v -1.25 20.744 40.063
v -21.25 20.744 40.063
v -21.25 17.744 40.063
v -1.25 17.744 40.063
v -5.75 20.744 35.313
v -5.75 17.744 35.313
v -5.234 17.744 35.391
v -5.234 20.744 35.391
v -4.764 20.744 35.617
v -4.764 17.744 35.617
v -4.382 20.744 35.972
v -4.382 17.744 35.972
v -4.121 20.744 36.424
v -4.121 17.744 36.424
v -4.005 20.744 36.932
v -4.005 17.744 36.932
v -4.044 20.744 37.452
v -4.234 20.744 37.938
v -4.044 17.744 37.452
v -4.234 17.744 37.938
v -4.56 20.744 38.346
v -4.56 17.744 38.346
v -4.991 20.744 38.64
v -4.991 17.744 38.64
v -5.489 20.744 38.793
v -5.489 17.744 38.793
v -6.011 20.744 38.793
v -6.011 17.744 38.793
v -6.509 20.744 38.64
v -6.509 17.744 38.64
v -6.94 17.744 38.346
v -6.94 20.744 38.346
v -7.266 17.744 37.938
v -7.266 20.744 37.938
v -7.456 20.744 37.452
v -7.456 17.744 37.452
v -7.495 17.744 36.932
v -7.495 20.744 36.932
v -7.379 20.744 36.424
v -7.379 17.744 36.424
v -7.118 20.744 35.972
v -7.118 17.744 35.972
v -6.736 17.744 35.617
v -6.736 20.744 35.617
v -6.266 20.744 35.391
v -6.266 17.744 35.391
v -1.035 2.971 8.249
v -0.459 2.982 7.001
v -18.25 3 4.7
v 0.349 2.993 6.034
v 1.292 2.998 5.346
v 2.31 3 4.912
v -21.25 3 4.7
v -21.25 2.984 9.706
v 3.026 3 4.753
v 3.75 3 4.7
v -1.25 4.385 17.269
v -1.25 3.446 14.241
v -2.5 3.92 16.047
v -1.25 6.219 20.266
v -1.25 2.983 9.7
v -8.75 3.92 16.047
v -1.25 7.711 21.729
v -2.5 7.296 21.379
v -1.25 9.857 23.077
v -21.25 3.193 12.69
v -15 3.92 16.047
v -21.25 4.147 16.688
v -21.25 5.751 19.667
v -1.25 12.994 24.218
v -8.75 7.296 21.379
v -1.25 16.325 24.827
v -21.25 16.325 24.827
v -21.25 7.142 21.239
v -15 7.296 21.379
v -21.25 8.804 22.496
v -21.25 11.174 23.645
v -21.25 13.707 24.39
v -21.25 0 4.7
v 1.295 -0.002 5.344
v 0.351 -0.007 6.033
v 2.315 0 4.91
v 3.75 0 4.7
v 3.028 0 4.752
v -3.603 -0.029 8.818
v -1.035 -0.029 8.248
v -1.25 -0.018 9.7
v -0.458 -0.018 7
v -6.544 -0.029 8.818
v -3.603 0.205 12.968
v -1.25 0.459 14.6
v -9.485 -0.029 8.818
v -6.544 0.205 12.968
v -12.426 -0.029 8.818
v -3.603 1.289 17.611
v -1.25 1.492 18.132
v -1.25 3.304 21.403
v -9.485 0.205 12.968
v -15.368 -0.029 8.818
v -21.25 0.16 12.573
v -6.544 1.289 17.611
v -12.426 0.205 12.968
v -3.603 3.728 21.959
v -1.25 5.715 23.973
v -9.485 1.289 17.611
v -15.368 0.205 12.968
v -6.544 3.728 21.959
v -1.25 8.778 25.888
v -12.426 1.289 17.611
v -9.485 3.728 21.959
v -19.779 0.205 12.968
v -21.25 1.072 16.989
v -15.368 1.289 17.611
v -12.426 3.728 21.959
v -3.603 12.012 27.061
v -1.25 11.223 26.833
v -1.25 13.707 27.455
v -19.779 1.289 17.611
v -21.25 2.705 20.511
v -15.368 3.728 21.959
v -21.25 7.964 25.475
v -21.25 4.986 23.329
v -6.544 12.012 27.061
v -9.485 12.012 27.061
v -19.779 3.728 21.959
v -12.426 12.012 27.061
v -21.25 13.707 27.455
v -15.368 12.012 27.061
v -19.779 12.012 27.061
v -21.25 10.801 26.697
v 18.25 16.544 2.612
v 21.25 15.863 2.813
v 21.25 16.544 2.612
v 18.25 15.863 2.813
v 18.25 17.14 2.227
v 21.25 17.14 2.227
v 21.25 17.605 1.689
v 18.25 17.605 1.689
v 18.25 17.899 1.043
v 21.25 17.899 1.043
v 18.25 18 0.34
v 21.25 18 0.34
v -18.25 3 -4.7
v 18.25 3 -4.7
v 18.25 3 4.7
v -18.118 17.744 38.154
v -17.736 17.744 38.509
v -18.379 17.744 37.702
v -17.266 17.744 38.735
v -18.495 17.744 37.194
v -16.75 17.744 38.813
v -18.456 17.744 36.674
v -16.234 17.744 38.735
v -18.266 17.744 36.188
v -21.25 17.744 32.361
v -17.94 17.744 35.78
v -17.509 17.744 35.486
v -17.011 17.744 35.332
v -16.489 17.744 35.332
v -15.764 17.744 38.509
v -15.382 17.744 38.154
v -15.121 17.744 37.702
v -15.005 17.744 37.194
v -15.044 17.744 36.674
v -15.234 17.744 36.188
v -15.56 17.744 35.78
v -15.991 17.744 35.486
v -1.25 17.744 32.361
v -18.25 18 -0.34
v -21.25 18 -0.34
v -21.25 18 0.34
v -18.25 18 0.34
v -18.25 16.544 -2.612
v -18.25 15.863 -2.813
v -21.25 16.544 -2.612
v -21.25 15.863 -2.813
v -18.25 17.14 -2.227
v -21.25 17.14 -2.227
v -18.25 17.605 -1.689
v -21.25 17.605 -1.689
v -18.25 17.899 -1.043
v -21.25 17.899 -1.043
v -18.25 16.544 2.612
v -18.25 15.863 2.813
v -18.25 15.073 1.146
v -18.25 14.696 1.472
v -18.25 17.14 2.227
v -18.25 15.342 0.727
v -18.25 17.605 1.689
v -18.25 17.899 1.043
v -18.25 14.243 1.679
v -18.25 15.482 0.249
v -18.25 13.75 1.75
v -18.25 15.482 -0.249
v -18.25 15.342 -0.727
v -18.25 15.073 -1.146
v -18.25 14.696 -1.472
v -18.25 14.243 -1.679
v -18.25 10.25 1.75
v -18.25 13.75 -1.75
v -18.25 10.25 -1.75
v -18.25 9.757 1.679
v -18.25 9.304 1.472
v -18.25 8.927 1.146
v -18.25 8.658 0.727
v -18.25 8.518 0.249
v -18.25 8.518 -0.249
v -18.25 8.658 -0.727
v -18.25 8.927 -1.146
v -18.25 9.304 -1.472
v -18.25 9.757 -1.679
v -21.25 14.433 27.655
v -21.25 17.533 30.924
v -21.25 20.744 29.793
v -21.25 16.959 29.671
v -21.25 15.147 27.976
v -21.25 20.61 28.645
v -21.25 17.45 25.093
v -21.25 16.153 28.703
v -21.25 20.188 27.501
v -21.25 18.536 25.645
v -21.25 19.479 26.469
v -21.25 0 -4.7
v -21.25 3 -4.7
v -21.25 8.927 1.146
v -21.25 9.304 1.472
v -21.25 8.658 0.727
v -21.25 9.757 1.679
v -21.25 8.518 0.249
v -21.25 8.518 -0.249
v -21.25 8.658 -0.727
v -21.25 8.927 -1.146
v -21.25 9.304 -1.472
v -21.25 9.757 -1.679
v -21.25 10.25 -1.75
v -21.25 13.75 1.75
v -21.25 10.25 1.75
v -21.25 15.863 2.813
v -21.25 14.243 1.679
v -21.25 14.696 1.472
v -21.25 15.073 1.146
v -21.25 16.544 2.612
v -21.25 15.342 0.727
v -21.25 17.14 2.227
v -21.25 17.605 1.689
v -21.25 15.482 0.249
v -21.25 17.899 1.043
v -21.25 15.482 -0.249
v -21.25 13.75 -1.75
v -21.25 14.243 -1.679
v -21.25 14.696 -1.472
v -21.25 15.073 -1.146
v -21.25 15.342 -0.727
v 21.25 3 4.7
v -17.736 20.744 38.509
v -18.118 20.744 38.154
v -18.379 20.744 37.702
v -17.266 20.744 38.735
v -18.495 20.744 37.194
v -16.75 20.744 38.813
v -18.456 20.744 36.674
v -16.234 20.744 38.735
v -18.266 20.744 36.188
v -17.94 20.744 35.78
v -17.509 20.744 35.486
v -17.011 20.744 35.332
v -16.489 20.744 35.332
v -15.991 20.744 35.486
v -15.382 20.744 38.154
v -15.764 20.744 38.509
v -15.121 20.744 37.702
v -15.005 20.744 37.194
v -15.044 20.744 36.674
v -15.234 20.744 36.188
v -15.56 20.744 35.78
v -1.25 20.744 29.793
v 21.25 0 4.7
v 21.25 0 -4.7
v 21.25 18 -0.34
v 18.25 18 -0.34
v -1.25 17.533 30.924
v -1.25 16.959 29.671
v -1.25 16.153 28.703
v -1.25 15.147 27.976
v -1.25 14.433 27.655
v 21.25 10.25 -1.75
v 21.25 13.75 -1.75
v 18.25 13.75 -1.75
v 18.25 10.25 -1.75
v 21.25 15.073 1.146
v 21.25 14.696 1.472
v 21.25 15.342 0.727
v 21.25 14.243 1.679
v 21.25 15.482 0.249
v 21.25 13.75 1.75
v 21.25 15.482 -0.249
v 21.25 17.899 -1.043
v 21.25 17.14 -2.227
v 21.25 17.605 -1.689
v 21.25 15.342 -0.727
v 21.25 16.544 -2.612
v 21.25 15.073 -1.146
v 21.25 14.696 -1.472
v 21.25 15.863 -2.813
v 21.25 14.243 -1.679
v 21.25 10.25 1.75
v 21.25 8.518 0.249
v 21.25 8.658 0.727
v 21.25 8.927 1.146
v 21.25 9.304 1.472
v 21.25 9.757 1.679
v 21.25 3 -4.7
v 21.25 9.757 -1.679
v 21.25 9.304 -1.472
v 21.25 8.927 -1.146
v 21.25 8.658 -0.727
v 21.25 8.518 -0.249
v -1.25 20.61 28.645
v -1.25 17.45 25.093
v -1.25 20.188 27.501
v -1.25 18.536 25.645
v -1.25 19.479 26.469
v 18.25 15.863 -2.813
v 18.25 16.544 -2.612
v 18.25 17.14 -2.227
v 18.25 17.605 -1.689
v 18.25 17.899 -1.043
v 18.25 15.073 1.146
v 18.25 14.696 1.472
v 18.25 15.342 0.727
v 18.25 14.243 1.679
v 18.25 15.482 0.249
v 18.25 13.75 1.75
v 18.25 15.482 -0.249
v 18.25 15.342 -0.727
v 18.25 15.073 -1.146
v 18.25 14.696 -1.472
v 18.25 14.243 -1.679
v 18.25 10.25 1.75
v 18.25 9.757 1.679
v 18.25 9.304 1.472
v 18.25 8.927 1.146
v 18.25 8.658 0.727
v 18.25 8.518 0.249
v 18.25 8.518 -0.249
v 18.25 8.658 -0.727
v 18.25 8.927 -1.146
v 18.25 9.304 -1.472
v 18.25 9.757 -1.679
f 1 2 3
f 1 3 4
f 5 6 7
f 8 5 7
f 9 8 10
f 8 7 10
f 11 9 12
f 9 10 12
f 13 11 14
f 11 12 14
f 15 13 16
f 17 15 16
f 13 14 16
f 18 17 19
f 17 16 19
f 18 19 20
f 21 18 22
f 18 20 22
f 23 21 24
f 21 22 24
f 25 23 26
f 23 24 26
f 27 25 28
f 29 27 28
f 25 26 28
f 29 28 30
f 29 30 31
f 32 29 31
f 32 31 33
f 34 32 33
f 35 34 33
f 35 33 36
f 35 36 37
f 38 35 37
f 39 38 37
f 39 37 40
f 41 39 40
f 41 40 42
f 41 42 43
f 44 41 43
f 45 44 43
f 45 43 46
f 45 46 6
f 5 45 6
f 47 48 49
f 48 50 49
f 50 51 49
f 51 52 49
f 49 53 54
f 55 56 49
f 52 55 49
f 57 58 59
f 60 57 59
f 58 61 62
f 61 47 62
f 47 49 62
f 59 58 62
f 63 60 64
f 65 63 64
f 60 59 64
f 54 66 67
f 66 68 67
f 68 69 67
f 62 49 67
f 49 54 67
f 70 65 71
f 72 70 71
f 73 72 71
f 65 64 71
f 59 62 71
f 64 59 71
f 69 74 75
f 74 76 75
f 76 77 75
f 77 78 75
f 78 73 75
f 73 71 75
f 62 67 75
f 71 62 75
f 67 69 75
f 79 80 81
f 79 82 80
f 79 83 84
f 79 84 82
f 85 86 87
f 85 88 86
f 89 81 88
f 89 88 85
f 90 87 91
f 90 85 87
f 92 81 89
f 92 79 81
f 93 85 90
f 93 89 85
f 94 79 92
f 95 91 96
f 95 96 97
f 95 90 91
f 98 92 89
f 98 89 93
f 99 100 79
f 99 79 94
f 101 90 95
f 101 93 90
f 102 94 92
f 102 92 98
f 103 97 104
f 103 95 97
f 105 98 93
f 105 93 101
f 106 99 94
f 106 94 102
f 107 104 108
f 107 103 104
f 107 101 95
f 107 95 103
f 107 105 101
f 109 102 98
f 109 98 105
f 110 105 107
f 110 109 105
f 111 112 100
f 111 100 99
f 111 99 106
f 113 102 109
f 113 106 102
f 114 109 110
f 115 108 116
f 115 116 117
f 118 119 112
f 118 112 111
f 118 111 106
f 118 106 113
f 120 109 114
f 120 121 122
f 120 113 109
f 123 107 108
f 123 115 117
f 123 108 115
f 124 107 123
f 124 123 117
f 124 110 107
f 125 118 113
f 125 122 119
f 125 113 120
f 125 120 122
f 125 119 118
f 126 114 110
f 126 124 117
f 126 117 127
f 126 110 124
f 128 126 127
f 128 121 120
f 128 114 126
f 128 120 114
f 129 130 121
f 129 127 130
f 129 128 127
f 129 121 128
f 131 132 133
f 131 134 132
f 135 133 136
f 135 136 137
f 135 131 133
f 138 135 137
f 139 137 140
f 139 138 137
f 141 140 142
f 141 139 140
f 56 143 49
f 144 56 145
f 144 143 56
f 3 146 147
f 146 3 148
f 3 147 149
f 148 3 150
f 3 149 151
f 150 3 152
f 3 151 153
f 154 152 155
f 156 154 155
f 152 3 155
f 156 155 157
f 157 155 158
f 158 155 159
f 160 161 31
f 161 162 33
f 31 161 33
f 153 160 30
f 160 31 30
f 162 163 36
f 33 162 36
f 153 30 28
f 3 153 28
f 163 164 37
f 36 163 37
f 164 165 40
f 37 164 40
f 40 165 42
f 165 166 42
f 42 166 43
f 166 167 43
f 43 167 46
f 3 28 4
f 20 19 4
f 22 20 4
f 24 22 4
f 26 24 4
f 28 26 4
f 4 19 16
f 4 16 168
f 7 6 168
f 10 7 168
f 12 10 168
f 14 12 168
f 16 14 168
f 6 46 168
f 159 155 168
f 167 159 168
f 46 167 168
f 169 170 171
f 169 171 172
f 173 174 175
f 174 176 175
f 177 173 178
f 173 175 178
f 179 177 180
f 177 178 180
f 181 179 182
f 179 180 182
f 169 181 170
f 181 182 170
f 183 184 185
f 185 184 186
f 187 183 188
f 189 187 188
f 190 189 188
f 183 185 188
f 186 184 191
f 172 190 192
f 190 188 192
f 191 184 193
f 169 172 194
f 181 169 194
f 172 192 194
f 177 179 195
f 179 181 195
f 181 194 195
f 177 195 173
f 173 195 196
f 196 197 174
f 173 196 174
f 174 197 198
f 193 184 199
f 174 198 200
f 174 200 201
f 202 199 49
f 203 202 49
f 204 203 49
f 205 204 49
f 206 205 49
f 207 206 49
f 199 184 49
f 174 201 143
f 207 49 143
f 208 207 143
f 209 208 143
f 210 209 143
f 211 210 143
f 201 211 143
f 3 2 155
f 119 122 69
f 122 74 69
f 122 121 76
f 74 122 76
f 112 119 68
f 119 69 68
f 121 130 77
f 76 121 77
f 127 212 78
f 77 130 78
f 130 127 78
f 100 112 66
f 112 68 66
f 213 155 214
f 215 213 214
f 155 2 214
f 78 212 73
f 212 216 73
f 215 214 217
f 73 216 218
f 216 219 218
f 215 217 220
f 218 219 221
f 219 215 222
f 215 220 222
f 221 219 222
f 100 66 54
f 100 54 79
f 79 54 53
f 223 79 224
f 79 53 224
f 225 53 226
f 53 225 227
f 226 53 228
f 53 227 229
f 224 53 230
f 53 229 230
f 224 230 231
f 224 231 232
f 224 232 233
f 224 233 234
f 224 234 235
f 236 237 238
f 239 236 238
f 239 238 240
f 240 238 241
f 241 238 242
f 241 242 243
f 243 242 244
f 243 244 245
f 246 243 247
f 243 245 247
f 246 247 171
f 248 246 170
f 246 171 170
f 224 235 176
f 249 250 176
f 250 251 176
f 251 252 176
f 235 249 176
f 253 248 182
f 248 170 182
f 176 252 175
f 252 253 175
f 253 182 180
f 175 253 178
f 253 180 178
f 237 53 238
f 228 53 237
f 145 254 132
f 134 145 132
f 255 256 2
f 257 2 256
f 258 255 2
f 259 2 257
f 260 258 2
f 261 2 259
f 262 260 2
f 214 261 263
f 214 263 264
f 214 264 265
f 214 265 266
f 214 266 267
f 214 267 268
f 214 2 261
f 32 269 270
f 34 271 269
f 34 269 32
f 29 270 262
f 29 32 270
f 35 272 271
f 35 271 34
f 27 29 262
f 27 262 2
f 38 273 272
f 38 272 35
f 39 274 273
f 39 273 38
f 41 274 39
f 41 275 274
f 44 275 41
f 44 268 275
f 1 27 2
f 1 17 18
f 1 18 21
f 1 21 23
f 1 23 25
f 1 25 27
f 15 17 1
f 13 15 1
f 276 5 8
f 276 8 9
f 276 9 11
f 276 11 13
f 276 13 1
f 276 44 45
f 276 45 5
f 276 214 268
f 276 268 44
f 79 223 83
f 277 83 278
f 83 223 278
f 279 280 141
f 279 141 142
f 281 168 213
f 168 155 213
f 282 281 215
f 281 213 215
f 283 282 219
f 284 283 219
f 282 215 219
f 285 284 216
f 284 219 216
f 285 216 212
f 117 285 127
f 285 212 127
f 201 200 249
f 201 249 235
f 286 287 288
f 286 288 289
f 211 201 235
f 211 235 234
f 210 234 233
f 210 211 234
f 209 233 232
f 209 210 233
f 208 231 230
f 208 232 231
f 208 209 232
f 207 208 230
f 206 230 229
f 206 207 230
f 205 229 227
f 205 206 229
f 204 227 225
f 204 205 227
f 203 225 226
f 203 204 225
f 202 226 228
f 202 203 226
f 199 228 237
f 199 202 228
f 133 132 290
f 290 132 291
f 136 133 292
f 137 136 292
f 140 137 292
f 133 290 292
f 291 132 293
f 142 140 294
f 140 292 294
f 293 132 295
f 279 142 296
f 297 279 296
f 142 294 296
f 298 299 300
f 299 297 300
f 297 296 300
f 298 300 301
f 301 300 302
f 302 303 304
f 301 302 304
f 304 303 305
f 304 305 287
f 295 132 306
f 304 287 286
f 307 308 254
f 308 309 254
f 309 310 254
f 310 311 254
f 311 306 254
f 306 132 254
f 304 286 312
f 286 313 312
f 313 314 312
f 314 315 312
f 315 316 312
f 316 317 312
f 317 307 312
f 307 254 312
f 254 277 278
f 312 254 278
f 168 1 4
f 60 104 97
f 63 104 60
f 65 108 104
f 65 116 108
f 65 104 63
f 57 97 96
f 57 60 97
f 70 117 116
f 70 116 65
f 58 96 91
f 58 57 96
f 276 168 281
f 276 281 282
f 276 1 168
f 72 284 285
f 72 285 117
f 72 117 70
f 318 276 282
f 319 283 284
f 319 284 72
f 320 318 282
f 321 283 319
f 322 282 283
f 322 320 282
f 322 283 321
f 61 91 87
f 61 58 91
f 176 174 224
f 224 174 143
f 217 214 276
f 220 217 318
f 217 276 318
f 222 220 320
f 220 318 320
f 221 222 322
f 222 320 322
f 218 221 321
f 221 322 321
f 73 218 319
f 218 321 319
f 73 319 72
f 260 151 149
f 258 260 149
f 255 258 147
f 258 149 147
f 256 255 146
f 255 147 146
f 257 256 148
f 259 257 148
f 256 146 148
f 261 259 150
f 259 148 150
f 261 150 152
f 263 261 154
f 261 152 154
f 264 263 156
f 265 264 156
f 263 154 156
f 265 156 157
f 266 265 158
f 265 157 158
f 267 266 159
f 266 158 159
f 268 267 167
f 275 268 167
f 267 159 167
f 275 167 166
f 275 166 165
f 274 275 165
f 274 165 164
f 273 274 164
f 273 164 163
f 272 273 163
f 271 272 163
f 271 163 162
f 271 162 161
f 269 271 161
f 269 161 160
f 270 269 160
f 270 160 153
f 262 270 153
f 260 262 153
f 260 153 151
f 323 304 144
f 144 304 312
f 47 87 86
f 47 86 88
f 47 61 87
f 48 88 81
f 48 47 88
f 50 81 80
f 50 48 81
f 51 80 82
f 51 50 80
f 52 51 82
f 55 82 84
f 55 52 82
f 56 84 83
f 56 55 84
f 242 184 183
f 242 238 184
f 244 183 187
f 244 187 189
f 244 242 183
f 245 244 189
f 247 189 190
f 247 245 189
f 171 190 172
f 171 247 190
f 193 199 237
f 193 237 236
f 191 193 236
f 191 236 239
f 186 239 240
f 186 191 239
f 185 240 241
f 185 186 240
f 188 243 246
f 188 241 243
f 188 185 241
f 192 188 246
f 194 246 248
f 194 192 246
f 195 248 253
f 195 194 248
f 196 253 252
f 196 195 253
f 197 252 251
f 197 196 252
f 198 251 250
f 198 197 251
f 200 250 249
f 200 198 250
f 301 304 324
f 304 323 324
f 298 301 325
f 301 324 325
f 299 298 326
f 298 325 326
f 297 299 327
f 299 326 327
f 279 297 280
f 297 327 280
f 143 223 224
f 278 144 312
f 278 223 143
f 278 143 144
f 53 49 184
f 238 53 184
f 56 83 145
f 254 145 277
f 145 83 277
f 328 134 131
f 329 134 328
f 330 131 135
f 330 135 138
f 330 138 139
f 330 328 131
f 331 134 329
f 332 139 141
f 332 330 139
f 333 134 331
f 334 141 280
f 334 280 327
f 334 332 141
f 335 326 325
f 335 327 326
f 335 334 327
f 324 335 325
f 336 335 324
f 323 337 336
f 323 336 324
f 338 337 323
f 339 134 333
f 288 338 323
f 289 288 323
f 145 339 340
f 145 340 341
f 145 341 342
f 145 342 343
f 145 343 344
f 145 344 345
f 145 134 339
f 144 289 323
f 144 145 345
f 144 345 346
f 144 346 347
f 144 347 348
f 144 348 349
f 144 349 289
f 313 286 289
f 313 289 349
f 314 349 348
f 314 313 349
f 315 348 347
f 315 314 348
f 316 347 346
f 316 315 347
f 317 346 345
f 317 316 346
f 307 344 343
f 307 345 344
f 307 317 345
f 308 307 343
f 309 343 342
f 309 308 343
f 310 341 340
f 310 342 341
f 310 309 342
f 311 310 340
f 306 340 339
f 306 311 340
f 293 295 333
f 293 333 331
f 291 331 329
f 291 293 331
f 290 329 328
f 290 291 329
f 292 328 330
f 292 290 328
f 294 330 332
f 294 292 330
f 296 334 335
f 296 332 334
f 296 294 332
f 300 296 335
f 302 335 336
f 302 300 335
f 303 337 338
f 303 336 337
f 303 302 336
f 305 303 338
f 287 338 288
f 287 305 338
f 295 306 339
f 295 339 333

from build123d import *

# Parameters (mm, degrees)
SKETCH_2_W          = 42.5
SKETCH_2_H          = 9.4
EXTRUDE_1_DEPTH     = 3
SKETCH_3_W          = 3
SKETCH_3_H          = 9.4
EXTRUDE_2_DEPTH     = 15
CUT_EXTRUDE_3_DEPTH = 47.393318484
CUT_EXTRUDE_4_DEPTH = 47.393318484
FILLET_2_R          = 2.5
EXTRUDE_5_DEPTH     = 20
SKETCH_12_W         = 20
SKETCH_12_H         = 15
EXTRUDE_6_DEPTH     = 3
FILLET_3_R          = 5
SKETCH_13_R         = 1.75
CUT_EXTRUDE_5_DEPTH = 49.708304406
FILLET_4_R          = 5


with BuildPart() as part:
    # 草图2 → 凸台-拉伸1 (new body)
    with BuildSketch(Plane(origin=(0, 0, 0), x_dir=(1, 0, 0), z_dir=(0, 1, 0))):
        Rectangle(SKETCH_2_W, SKETCH_2_H)
    extrude(amount=EXTRUDE_1_DEPTH)

    # 草图3 → 凸台-拉伸2 (add)
    with BuildSketch(Plane(origin=(0, 3, 0), x_dir=(1, 0, 0), z_dir=(0, 1, 0))):
        with Locations((-19.75, 0)):
            Rectangle(SKETCH_3_W, SKETCH_3_H)
        with Locations((19.75, 0)):
            Rectangle(SKETCH_3_W, SKETCH_3_H)
    extrude(amount=EXTRUDE_2_DEPTH)

    # 草图7 → 切除-拉伸3 (cut, through all)
    with BuildSketch(Plane(origin=(21.25, 0, 0), x_dir=(0, 0, -1), z_dir=(1, 0, 0))):
        with BuildLine():
            Line((1.75, 13.75), (1.75, 10.25))
            ThreePointArc((1.75, 10.25), (0, 8.5), (-1.75, 10.25))
            Line((-1.75, 10.25), (-1.75, 13.75))
            ThreePointArc((-1.75, 13.75), (0, 15.5), (1.75, 13.75))
        make_face()
    extrude(amount=-CUT_EXTRUDE_3_DEPTH, mode=Mode.SUBTRACT)

    # 草图8 → 切除-拉伸4 (cut, through all)
    with BuildSketch(Plane(origin=(21.25, 0, 0), x_dir=(0, 0, -1), z_dir=(1, 0, 0))):
        Polygon((-4.7, 3), (-2.5, 18), (-2.5, 19), (2.5, 19), (2.5, 18), (4.7, 3), (5.7, 3), (5.7, 21), (-5.7, 21), (-5.7, 3), align=None)
    extrude(amount=-CUT_EXTRUDE_4_DEPTH, mode=Mode.SUBTRACT)

    # 圆角2
    fillet_2_edges = [part.edges().sort_by_distance(p)[0] for p in [
        (19.75, 18, 2.5),
        (19.75, 18, -2.5),
        (-19.75, 18, 2.5),
        (-19.75, 18, -2.5),
    ]]
    fillet(fillet_2_edges, radius=FILLET_2_R)

    # 草图11 → 凸台-拉伸5 (add)
    with BuildSketch(Plane.ZY.offset(21.25)):
        with BuildLine():
            Line((4.7, 0), (4.7, 3))
            add(Edge.make_bspline(
                [(4.7, 3), (6.962486025, 3), (10.1417855, 2.862932252), (16.337474526, 3.528245294), (24.23161516, 8.297891954), (25.062946505, 16.379576905), (25.062946505, 20.743946169)],
                knots=[0, 0, 0, 0, 0.173642334, 0.358241977, 0.55622398, 1, 1, 1, 1], degree=3))
            Line((25.062946505, 20.743946169), (28.062946505, 20.743946169))
            add(Edge.make_bspline(
                [(4.7, 0), (5.076993719, 0), (5.855225367, -0.004193676), (7.217639973, -0.020495438), (8.810719384, -0.039341399), (10.76734867, 0.000672168), (12.947992739, 0.170949768), (15.24934878, 0.54571413), (17.628276305, 1.229289778), (19.903594775, 2.272660667), (21.99790066, 3.662053242), (23.859207745, 5.447000714), (25.7878767, 8.220055058), (26.937595088, 11.247139627), (27.595828159, 14.298246056), (27.892483676, 16.554104562), (28.014441837, 18.363930093), (28.056904435, 19.75444003), (28.062946505, 20.410858245), (28.062946505, 20.743946169)],
                knots=[0, 0, 0, 0, 0.03125, 0.0625, 0.125, 0.1875, 0.25, 0.3125, 0.375, 0.4375, 0.5, 0.5625, 0.625, 0.75, 0.8125, 0.875, 0.9375, 0.96875, 1, 1, 1, 1], degree=3))
        make_face()
    extrude(amount=-EXTRUDE_5_DEPTH)

    # 草图12 → 凸台-拉伸6 (add)
    with BuildSketch(Plane(origin=(0, 20.743946169, 0), x_dir=(1, 0, 0), z_dir=(0, 1.0, 2.3592378051162655e-12))):
        with Locations((-11.25, -32.562946505)):
            Rectangle(SKETCH_12_W, SKETCH_12_H)
    extrude(amount=-EXTRUDE_6_DEPTH)

    # 圆角3
    fillet_3_edges = [part.edges().sort_by_distance(p)[0] for p in [
        (-11.25, 17.743946169, 27.967624868),
        (-11.25, 20.743946169, 25.062946505),
    ]]
    fillet(fillet_3_edges, radius=FILLET_3_R)

    # 草图13 → 切除-拉伸5 (cut, through all)
    with BuildSketch(Plane.XZ.offset(-17.743946169)):
        with Locations(Location((-5.75, 37.062946505, 0), (0, 0, 270))):
            Circle(SKETCH_13_R)
        with Locations(Location((-16.75, 37.062946505, 0), (0, 0, 90))):
            Circle(SKETCH_13_R)
    extrude(amount=-CUT_EXTRUDE_5_DEPTH, mode=Mode.SUBTRACT)

    # 圆角4
    fillet_4_edges = [part.edges().sort_by_distance(p)[0] for p in [
        (-1.25, 1.5, 4.7),
    ]]
    fillet(fillet_4_edges, radius=FILLET_4_R)


solid = part.part
